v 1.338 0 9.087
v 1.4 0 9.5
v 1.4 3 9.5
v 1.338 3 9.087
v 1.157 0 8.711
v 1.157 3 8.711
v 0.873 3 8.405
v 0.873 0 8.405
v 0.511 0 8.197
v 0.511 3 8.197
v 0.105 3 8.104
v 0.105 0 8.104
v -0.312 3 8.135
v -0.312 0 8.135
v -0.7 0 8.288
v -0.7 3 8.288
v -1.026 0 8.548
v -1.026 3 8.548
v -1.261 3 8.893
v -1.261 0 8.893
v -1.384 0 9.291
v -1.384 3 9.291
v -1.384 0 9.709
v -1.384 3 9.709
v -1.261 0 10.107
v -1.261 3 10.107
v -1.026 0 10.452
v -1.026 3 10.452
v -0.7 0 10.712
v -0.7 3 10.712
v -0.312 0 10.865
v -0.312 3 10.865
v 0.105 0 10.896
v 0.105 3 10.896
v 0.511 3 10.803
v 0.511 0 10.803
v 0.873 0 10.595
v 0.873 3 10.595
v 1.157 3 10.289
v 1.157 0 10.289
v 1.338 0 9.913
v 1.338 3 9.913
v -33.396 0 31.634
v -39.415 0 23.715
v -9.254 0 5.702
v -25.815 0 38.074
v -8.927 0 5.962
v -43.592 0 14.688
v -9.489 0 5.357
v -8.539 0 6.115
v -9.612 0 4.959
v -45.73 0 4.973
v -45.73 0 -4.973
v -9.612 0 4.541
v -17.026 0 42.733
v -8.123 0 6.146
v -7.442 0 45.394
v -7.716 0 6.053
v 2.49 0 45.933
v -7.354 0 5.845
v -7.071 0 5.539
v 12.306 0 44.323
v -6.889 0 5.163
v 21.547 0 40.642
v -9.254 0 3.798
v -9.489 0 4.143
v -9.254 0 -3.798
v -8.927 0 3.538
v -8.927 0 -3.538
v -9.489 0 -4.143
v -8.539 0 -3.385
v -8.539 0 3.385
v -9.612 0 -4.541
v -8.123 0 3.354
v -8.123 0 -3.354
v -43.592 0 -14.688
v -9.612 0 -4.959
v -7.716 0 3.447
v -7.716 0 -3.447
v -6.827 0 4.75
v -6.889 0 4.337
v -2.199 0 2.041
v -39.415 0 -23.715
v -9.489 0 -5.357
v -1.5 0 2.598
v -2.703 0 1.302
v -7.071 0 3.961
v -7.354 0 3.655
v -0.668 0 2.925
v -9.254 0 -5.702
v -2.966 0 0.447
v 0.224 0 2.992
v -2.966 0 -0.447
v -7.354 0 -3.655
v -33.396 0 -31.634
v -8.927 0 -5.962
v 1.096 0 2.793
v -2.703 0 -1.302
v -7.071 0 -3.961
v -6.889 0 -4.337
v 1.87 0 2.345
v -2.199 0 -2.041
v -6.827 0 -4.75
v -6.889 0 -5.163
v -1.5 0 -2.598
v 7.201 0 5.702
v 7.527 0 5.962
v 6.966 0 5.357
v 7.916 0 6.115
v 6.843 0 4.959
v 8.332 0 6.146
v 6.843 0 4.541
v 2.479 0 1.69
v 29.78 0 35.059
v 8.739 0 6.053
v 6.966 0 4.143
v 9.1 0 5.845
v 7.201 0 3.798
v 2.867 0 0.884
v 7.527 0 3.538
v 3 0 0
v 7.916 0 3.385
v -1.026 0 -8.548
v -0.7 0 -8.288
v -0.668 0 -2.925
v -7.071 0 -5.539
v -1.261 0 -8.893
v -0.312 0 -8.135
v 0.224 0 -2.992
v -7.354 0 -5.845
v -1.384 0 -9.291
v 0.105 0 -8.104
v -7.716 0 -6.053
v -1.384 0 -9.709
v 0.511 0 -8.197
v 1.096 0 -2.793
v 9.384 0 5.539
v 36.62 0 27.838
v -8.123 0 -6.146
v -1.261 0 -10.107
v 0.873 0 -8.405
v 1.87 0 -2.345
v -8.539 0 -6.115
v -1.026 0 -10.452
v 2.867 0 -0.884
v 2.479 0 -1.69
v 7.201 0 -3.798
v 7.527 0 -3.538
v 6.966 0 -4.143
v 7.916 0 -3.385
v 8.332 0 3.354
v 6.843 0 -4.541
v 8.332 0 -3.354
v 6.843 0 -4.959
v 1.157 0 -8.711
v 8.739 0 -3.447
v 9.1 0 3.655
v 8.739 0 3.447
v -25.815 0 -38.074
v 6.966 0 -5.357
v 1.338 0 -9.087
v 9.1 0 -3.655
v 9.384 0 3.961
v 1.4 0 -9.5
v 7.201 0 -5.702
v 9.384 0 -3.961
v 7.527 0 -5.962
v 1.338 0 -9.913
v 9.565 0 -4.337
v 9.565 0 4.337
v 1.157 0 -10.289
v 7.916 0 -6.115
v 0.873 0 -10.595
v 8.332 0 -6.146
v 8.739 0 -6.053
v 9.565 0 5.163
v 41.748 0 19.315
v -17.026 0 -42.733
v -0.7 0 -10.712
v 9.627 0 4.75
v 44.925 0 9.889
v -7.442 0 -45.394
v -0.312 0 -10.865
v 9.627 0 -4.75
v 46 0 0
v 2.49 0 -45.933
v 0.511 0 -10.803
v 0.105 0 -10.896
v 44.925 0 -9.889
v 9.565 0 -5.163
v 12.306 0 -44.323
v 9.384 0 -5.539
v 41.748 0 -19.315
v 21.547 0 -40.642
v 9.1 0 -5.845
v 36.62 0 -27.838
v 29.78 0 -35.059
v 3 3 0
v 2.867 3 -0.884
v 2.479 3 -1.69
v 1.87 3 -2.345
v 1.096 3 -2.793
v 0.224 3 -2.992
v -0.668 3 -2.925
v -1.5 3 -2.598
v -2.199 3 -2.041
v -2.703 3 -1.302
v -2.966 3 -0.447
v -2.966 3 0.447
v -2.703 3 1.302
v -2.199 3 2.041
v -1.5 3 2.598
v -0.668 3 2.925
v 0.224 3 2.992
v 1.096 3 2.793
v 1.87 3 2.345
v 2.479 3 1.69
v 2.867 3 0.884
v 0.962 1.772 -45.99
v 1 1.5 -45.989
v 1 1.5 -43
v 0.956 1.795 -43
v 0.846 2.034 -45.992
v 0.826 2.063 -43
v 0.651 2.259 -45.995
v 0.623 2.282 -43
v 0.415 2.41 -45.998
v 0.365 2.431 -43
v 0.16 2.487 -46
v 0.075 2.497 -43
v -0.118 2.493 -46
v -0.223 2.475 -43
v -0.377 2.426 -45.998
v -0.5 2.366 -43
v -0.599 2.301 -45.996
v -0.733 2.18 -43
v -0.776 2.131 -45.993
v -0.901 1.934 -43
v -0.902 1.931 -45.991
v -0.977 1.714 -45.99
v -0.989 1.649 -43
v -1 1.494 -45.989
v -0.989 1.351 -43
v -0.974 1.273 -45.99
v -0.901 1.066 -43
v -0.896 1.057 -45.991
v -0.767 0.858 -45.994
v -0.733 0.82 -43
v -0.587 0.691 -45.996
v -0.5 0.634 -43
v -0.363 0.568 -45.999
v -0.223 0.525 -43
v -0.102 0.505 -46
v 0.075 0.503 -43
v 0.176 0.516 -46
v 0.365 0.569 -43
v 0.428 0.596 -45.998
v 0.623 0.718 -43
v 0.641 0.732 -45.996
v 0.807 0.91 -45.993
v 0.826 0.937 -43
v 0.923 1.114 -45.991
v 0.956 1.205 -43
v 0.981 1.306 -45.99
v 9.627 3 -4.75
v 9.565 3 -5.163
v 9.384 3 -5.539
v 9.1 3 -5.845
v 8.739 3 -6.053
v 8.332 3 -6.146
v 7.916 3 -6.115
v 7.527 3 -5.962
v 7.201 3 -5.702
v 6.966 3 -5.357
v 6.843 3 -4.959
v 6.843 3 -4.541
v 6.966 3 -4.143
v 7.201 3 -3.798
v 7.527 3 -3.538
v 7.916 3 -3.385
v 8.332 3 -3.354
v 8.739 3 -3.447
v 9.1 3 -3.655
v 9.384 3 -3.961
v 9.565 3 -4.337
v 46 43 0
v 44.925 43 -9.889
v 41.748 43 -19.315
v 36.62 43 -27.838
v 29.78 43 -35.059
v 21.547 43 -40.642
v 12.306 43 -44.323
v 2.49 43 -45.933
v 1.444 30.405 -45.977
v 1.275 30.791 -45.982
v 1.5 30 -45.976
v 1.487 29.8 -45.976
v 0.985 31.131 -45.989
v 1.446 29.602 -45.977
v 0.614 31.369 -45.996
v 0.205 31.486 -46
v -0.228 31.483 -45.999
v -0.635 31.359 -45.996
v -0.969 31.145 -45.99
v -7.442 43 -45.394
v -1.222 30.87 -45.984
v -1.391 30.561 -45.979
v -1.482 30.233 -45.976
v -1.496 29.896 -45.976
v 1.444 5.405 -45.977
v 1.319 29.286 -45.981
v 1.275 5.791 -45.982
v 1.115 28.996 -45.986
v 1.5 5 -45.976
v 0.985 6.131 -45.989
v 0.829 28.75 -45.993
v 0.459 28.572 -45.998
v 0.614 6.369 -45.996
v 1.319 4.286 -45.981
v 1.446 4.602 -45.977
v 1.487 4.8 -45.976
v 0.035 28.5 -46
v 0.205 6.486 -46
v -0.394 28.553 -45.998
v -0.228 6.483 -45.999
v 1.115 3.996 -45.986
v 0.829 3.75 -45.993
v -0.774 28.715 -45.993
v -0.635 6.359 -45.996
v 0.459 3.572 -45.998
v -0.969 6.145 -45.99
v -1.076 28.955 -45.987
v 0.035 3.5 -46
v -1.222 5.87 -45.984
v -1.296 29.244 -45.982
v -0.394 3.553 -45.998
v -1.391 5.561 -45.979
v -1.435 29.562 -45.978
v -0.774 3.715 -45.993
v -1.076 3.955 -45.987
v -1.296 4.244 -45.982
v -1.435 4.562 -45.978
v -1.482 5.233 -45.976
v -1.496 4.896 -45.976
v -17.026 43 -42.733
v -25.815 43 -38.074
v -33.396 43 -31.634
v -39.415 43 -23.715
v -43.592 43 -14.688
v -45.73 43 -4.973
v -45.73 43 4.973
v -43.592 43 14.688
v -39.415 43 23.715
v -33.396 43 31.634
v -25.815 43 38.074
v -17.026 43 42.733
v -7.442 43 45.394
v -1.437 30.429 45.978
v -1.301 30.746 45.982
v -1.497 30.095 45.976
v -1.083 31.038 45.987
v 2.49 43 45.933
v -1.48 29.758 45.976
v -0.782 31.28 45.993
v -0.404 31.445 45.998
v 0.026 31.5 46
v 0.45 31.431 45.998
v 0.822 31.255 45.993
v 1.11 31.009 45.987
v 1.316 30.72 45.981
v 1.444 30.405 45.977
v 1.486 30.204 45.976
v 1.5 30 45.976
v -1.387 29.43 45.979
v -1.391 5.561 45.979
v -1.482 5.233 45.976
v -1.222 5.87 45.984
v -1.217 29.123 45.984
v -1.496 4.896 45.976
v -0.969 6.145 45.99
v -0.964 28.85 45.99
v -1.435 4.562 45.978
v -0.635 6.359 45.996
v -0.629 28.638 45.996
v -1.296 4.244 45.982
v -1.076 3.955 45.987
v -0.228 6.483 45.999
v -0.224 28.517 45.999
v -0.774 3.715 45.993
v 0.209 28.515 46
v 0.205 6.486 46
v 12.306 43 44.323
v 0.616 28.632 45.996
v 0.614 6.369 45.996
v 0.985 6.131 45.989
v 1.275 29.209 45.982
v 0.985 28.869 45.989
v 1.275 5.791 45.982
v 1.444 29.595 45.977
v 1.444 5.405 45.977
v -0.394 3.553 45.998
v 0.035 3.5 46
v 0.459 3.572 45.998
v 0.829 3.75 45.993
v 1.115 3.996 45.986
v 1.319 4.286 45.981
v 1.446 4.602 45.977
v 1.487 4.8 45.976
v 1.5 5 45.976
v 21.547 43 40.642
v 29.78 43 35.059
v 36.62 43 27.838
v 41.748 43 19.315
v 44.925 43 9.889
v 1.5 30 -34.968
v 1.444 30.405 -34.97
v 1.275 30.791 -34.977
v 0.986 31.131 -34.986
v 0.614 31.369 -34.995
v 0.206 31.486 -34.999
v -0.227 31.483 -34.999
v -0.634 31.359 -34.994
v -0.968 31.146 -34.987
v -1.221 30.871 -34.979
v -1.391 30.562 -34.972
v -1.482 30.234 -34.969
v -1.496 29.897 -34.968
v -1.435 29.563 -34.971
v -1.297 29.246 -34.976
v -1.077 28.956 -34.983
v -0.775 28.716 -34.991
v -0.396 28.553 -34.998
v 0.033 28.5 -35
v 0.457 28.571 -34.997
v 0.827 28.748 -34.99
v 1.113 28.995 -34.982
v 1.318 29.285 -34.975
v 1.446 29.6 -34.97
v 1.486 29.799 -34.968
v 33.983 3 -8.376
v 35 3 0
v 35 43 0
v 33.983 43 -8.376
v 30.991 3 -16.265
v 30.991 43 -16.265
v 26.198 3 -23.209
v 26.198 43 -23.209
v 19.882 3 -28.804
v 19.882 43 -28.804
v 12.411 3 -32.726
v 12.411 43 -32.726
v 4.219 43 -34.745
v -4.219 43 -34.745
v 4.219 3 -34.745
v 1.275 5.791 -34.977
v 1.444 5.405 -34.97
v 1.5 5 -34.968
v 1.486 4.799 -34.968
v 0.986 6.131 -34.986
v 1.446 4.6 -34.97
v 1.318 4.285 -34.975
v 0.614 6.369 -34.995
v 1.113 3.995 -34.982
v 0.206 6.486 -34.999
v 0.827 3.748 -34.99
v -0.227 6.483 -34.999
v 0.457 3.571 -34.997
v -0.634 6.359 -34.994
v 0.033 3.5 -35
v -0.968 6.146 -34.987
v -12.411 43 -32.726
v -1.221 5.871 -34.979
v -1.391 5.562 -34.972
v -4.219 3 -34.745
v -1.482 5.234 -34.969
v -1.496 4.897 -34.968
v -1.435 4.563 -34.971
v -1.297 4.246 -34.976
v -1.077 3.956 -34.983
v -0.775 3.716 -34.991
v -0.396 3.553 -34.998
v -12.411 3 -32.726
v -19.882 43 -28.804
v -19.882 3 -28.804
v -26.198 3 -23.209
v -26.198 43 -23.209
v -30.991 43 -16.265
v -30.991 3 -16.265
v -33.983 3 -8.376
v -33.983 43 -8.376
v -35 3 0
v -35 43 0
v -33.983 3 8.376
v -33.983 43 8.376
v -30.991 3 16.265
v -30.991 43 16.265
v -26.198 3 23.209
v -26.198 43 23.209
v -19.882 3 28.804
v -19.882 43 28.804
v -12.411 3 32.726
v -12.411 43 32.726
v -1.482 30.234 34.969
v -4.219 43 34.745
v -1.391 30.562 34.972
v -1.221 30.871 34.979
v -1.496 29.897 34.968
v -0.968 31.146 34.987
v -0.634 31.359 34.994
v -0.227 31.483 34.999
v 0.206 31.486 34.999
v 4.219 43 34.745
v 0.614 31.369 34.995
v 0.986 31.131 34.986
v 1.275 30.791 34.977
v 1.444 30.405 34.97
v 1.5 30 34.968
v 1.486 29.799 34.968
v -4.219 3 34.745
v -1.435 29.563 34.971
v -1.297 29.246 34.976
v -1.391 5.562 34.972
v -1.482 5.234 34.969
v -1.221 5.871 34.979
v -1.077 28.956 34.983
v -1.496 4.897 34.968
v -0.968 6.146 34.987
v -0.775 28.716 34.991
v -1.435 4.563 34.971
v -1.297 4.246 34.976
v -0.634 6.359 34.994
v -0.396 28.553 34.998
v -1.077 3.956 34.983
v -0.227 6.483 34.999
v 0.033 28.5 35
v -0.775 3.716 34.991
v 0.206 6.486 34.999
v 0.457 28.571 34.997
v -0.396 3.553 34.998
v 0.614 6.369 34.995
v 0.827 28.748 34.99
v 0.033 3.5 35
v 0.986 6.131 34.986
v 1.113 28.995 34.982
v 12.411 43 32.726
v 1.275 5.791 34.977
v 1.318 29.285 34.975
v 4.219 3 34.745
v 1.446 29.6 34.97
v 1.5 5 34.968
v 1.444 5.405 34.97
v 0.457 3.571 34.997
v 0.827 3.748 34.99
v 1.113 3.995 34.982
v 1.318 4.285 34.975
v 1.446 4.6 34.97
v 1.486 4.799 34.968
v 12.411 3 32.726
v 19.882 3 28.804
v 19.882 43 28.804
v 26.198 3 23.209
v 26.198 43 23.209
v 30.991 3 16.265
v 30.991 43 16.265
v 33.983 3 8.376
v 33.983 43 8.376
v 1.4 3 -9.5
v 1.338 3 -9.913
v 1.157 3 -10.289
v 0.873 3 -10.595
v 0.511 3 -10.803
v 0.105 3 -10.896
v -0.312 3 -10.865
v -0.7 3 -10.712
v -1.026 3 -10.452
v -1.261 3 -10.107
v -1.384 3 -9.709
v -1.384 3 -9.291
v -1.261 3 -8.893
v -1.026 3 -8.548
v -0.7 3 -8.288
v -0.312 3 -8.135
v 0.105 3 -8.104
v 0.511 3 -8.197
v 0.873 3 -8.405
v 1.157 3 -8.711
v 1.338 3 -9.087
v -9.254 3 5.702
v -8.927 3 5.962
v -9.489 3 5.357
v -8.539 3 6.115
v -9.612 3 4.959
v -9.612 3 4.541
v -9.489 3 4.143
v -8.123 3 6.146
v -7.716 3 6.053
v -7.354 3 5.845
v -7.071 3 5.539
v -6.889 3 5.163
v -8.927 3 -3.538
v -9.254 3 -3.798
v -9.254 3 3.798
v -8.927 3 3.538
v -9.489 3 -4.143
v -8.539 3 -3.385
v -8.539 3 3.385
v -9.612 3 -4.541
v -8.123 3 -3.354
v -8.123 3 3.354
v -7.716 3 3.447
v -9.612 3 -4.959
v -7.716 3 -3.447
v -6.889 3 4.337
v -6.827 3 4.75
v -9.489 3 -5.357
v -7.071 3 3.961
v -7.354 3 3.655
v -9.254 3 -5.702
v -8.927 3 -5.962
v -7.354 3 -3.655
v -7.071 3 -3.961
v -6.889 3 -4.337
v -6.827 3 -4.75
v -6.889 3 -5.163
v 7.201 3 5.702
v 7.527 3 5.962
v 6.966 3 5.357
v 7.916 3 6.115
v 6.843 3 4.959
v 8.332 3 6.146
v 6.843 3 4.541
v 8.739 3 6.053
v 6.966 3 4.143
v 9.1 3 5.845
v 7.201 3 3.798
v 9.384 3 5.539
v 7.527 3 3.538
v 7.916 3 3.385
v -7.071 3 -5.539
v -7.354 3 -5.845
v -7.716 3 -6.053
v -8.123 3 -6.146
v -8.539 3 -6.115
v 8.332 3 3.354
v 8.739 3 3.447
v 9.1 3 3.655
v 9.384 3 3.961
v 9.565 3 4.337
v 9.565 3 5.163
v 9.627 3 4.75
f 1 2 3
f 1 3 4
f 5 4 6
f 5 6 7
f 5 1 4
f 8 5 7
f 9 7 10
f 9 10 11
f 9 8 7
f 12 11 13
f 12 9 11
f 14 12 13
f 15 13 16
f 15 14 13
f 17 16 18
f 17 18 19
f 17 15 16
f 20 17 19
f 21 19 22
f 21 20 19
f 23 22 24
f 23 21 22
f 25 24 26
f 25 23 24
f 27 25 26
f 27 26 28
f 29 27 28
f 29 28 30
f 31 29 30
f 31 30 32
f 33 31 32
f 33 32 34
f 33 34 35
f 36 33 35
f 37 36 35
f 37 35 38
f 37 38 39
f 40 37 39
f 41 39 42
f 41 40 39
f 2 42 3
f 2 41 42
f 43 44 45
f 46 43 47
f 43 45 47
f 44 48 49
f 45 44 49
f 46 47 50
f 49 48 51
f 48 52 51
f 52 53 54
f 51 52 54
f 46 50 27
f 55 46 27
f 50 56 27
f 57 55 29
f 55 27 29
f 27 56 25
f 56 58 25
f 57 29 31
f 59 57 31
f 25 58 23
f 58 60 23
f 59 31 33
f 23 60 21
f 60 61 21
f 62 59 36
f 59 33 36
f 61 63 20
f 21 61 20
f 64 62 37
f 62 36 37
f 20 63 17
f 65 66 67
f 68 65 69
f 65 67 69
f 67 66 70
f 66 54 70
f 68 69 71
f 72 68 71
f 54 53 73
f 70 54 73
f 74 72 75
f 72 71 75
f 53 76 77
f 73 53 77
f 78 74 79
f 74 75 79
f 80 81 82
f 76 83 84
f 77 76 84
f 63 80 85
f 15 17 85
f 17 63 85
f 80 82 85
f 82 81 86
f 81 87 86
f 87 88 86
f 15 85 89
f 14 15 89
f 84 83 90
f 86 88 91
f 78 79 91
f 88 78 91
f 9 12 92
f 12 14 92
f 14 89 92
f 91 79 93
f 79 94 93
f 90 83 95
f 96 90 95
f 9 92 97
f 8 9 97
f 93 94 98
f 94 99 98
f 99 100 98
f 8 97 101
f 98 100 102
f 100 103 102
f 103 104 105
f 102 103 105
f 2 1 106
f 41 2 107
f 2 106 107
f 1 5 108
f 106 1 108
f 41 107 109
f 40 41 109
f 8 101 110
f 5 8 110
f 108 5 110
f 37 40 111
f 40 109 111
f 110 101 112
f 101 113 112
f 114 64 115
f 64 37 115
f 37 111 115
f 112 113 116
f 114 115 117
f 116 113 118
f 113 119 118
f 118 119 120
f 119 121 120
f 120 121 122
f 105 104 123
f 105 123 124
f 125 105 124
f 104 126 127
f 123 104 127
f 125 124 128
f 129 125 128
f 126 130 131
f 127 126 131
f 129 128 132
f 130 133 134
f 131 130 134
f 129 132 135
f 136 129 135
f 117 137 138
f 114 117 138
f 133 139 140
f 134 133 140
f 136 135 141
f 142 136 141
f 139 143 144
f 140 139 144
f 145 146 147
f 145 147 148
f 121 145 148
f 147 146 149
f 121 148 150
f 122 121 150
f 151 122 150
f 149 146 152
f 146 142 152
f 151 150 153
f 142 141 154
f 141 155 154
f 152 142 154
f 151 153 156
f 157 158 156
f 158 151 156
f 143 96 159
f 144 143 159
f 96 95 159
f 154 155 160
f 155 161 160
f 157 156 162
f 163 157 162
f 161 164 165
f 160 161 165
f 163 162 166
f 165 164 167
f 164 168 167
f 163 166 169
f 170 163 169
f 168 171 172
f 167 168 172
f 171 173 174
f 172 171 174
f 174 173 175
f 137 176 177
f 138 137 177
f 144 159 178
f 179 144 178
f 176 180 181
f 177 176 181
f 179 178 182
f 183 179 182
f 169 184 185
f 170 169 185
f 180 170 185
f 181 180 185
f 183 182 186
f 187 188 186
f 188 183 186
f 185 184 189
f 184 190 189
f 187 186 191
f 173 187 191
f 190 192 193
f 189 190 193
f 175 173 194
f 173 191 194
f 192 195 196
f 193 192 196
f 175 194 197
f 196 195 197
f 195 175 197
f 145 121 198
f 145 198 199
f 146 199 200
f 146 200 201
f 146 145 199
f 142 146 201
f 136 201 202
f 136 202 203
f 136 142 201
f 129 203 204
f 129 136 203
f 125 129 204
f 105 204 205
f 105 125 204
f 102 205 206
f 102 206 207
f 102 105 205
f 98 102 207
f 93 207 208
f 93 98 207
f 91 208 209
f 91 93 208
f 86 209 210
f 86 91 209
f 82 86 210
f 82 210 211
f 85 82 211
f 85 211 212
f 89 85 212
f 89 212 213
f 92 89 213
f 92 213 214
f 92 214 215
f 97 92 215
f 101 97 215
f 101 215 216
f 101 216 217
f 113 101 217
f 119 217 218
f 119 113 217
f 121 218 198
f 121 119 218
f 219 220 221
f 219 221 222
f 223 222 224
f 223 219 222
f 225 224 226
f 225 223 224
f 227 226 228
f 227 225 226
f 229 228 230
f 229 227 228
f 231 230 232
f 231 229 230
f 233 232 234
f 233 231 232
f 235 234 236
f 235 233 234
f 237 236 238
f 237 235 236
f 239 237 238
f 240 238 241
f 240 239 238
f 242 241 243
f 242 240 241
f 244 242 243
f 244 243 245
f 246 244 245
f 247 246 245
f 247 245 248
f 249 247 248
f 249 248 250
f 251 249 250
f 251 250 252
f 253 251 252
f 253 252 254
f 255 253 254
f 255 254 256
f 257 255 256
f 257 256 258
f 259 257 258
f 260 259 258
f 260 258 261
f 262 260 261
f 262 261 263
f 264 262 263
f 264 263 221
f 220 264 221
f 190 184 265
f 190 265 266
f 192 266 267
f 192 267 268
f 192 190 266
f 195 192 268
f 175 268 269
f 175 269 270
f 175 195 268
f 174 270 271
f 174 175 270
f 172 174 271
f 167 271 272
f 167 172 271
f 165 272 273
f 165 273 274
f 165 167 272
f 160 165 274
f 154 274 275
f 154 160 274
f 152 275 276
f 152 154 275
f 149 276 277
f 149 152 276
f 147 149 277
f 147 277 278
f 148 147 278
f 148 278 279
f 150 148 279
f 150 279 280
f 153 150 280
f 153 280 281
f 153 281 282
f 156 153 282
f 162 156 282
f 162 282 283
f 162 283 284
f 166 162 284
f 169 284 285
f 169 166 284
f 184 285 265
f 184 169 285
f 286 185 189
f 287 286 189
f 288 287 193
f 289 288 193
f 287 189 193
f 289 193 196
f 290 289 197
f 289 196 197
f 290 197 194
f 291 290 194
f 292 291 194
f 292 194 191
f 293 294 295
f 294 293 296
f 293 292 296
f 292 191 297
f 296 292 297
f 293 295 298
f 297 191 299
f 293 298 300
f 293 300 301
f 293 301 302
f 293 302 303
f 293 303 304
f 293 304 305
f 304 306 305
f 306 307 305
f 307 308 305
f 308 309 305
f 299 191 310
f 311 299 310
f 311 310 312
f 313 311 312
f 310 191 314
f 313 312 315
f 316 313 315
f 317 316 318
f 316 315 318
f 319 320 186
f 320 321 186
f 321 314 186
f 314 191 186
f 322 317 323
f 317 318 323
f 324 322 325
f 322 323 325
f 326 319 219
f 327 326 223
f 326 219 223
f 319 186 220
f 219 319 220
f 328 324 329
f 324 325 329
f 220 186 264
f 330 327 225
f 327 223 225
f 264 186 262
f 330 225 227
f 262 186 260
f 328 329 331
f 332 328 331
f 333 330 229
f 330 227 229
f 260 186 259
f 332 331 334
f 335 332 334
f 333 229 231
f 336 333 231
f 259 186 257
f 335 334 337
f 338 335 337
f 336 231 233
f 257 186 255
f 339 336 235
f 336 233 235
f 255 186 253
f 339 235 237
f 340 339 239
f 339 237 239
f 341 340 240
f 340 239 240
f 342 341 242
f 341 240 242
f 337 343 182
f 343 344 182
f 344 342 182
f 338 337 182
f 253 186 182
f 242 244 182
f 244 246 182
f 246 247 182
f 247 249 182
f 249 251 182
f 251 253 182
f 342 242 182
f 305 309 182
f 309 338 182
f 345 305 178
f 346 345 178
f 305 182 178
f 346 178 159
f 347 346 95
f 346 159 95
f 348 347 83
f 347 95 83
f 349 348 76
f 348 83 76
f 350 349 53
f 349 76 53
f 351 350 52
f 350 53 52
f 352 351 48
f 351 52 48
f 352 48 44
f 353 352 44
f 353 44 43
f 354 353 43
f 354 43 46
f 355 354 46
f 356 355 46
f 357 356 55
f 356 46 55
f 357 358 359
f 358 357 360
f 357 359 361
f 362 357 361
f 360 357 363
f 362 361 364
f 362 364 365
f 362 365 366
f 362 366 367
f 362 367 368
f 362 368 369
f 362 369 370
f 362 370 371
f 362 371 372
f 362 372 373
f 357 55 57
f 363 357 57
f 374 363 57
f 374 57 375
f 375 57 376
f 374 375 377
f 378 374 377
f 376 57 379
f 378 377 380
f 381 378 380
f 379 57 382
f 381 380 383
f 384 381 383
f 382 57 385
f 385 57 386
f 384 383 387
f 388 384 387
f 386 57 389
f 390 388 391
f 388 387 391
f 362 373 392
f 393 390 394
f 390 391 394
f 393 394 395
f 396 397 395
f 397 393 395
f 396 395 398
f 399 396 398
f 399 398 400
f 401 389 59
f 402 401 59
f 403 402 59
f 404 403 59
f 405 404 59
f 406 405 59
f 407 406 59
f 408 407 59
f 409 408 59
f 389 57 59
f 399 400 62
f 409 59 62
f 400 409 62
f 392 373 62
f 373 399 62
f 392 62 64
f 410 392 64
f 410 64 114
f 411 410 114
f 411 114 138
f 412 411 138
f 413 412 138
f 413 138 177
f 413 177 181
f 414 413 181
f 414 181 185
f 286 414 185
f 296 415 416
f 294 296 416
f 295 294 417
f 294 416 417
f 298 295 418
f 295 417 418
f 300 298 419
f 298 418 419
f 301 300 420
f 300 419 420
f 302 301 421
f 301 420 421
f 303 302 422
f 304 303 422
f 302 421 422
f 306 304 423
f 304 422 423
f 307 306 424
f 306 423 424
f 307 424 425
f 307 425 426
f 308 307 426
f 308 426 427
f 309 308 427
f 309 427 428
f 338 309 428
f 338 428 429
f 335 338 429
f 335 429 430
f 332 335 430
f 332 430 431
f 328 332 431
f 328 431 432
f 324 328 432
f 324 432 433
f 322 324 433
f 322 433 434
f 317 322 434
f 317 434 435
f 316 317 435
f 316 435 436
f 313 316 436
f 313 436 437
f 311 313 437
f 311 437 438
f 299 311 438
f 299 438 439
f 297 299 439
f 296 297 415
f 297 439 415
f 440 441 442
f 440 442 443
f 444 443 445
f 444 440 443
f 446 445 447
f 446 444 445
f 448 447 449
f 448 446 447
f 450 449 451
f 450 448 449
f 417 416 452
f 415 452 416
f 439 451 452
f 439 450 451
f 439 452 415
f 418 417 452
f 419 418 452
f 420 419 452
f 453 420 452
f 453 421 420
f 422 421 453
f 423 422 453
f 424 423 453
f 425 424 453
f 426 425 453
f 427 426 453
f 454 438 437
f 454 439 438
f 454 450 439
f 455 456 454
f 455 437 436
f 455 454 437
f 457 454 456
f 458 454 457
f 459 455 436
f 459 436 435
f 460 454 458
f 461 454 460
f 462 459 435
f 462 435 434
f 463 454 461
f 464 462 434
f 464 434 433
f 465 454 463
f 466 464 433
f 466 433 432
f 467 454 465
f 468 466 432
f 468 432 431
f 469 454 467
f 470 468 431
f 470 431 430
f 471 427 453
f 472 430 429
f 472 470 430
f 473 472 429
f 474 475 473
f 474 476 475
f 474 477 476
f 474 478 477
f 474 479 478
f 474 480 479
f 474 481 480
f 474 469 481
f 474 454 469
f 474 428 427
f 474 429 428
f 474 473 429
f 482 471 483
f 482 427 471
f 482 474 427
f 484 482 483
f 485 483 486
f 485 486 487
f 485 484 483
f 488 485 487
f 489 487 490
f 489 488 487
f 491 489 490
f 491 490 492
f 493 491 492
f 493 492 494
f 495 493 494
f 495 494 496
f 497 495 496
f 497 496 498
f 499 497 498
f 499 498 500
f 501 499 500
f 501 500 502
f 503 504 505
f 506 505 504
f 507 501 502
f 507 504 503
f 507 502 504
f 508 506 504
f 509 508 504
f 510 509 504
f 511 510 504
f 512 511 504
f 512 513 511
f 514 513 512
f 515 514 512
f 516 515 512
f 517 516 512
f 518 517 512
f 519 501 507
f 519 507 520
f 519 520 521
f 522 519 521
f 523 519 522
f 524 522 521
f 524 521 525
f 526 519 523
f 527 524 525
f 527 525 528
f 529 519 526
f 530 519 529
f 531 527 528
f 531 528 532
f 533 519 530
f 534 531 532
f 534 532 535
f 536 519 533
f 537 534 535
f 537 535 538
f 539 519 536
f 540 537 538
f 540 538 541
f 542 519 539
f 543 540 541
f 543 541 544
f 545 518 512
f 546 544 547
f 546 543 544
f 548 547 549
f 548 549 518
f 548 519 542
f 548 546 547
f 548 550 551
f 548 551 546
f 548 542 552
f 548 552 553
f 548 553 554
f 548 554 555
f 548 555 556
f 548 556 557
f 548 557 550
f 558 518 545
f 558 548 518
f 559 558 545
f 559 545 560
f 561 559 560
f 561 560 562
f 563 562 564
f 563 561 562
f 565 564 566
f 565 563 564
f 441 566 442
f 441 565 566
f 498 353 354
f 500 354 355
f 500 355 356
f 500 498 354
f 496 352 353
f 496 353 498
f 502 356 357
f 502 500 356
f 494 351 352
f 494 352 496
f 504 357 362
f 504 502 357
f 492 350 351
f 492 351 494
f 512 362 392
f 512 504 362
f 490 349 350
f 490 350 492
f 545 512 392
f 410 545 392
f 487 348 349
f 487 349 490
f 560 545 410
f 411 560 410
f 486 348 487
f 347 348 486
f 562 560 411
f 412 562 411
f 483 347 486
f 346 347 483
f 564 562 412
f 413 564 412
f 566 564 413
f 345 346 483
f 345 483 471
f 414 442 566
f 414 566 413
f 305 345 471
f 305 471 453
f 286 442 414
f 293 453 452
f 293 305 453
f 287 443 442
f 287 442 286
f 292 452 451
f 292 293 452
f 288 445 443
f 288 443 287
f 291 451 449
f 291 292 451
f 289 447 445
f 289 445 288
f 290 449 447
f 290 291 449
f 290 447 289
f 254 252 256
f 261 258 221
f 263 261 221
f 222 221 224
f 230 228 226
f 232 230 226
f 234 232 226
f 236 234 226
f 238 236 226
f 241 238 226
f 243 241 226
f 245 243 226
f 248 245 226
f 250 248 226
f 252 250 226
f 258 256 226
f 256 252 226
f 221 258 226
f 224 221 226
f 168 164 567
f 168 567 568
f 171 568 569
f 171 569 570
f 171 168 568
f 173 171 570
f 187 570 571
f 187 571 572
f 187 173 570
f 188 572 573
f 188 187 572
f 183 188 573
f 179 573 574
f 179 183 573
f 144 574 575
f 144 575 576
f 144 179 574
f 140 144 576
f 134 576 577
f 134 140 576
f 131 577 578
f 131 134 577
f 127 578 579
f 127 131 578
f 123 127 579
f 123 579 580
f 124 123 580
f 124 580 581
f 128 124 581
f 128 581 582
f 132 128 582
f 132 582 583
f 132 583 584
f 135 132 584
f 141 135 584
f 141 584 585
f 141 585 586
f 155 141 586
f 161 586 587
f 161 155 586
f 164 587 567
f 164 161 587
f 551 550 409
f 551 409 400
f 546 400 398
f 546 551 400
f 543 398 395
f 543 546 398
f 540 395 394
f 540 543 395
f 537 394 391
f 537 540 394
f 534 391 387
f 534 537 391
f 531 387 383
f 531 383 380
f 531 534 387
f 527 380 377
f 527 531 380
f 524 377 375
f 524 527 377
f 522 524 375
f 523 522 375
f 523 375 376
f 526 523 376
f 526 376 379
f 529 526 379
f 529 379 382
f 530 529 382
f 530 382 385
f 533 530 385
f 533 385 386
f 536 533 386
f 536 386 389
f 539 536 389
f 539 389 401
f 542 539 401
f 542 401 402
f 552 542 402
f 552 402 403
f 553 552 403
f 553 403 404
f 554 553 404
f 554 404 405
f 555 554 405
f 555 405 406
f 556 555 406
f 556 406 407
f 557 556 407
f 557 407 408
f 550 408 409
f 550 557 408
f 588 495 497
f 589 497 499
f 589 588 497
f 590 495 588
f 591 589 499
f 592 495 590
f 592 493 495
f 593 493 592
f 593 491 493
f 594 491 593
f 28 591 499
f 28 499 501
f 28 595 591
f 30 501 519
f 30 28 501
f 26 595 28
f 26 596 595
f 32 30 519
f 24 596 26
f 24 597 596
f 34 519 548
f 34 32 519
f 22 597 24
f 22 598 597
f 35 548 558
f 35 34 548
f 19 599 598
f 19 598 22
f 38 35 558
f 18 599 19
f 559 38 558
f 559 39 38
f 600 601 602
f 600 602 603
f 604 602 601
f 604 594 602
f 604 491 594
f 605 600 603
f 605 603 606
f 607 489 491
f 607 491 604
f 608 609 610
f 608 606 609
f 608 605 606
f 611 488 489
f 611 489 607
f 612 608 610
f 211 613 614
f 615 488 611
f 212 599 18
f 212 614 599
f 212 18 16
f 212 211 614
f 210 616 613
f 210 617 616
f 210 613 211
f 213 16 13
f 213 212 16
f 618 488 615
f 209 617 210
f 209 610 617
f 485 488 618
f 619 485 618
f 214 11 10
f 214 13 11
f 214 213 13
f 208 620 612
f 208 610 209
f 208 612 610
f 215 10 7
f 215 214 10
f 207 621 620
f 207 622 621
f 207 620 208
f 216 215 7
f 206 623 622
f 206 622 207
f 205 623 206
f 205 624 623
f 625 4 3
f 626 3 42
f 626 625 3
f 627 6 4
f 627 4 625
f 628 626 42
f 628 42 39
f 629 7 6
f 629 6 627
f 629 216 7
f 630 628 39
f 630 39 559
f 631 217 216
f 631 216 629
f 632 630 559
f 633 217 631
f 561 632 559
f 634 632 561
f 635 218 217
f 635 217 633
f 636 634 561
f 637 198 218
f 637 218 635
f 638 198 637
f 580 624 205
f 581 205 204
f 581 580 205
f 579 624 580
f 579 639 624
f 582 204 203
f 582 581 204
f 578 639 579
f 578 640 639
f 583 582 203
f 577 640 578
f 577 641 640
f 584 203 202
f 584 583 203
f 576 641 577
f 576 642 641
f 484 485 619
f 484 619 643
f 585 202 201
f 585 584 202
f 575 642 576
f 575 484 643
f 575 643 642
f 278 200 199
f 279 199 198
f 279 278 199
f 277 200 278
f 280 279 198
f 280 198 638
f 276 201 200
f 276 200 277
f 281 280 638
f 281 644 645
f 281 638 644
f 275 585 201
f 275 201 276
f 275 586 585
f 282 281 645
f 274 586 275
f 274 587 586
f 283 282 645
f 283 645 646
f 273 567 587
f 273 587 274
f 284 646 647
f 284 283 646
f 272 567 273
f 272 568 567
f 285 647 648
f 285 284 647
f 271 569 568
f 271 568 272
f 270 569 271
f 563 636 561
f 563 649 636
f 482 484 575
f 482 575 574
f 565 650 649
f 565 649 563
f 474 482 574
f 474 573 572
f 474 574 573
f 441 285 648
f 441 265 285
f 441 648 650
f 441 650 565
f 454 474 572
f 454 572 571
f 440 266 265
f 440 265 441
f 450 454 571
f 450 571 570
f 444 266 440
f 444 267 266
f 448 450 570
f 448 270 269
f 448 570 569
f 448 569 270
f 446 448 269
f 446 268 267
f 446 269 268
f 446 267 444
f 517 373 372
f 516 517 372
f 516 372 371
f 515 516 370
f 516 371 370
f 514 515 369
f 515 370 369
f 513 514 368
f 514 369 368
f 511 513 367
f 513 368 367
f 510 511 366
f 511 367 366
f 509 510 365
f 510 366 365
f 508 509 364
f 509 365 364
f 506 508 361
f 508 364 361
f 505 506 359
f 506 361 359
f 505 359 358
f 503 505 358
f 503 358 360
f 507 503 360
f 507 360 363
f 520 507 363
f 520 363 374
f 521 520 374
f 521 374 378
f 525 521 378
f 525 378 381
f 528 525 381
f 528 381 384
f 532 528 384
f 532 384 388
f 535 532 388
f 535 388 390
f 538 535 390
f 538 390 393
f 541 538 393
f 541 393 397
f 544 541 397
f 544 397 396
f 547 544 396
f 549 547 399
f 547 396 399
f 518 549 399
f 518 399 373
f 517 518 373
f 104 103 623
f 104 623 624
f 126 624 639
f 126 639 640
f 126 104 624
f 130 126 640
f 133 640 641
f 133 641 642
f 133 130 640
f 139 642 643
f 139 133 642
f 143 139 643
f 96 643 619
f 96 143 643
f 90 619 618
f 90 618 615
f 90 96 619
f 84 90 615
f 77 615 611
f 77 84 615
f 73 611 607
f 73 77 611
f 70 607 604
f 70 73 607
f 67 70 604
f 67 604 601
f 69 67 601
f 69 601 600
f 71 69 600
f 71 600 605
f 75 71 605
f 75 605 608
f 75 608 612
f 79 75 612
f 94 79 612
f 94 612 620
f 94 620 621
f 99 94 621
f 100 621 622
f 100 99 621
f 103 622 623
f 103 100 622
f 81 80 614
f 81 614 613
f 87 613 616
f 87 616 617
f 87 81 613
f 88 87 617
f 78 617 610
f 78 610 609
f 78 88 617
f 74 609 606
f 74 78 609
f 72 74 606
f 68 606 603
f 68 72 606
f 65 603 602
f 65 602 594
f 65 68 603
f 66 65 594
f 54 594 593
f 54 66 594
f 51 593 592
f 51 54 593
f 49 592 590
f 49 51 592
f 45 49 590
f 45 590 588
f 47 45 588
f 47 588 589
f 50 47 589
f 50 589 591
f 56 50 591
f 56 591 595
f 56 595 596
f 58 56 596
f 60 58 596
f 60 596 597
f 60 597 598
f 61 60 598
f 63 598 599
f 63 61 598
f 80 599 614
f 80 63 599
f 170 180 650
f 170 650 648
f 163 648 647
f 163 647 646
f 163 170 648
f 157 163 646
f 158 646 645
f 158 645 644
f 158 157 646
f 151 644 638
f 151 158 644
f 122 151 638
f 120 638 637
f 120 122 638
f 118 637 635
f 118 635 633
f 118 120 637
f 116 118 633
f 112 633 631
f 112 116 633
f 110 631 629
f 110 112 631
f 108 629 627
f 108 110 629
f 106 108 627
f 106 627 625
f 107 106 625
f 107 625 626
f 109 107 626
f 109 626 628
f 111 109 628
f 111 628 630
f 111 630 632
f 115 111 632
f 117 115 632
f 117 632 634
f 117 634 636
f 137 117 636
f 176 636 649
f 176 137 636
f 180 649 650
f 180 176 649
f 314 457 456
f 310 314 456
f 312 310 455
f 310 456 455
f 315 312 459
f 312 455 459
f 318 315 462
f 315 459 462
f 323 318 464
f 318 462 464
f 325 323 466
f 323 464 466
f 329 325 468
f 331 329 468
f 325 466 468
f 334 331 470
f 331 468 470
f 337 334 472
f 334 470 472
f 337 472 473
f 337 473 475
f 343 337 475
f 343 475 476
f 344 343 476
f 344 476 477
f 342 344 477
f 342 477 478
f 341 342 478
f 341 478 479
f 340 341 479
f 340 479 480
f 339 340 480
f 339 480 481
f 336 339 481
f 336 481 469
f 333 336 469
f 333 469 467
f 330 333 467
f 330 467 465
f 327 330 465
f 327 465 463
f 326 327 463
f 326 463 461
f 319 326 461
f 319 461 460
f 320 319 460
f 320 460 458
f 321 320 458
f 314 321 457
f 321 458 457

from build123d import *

# Parameters (mm, degrees)
SKETCH1_R               = 46
SKETCH1_R_2             = 3
SKETCH1_R_3             = 1.4
BOSS_EXTRUDE1_DEPTH     = 3
SKETCH6_R               = 1
CUT_EXTRUDE2_DEPTH      = 3
SKETCH7_R               = 46
SKETCH7_R_2             = 35
BOSS_EXTRUDE2_DEPTH     = 40
SKETCH8_R               = 1.5
CUT_EXTRUDE3_DEPTH      = 108
SKETCH9_R               = 1.5
CUT_EXTRUDE4_DEPTH      = 47.00000011
CUT_EXTRUDE4_DEPTH_BACK = 47.00000011


with BuildPart() as part:
    # Sketch1 → Boss-Extrude1 (new body)
    with BuildSketch(Plane(origin=(0, 0, 0), x_dir=(1, 0, 0), z_dir=(0, 1, 0))):
        Circle(SKETCH1_R)
        Circle(SKETCH1_R_2, mode=Mode.SUBTRACT)
        with Locations((0, 9.5)):
            Circle(SKETCH1_R_3, mode=Mode.SUBTRACT)
        with Locations((8.227241336, 4.75)):
            Circle(SKETCH1_R_3, mode=Mode.SUBTRACT)
        with Locations((8.227241336, -4.75)):
            Circle(SKETCH1_R_3, mode=Mode.SUBTRACT)
        with Locations((0, -9.5)):
            Circle(SKETCH1_R_3, mode=Mode.SUBTRACT)
        with Locations((-8.227241336, -4.75)):
            Circle(SKETCH1_R_3, mode=Mode.SUBTRACT)
        with Locations((-8.227241336, 4.75)):
            Circle(SKETCH1_R_3, mode=Mode.SUBTRACT)
    extrude(amount=BOSS_EXTRUDE1_DEPTH)

    # Sketch6 → Cut-Extrude2 (cut)
    with BuildSketch(Plane.XY.offset(-46)):
        with Locations((0, 1.5)):
            Circle(SKETCH6_R)
    extrude(amount=CUT_EXTRUDE2_DEPTH, mode=Mode.SUBTRACT)

    # Sketch7 → Boss-Extrude2 (add)
    with BuildSketch(Plane(origin=(0, 3, 0), x_dir=(1, 0, 0), z_dir=(0, 1, 0))):
        Circle(SKETCH7_R)
        Circle(SKETCH7_R_2, mode=Mode.SUBTRACT)
    extrude(amount=BOSS_EXTRUDE2_DEPTH)

    # Sketch8 → Cut-Extrude3 (cut)
    with BuildSketch(Plane.XY.offset(46)):
        with Locations((0, 30)):
            Circle(SKETCH8_R)
    extrude(amount=-CUT_EXTRUDE3_DEPTH, mode=Mode.SUBTRACT)

    # Sketch9 → Cut-Extrude4 (cut, two sides)
    with BuildSketch(Plane.XY) as cut_extrude4_sk:
        with Locations((0, 5)):
            Circle(SKETCH9_R)
    extrude(amount=CUT_EXTRUDE4_DEPTH, mode=Mode.SUBTRACT)
    extrude(cut_extrude4_sk.sketch, amount=-CUT_EXTRUDE4_DEPTH_BACK, mode=Mode.SUBTRACT)


solid = part.part
